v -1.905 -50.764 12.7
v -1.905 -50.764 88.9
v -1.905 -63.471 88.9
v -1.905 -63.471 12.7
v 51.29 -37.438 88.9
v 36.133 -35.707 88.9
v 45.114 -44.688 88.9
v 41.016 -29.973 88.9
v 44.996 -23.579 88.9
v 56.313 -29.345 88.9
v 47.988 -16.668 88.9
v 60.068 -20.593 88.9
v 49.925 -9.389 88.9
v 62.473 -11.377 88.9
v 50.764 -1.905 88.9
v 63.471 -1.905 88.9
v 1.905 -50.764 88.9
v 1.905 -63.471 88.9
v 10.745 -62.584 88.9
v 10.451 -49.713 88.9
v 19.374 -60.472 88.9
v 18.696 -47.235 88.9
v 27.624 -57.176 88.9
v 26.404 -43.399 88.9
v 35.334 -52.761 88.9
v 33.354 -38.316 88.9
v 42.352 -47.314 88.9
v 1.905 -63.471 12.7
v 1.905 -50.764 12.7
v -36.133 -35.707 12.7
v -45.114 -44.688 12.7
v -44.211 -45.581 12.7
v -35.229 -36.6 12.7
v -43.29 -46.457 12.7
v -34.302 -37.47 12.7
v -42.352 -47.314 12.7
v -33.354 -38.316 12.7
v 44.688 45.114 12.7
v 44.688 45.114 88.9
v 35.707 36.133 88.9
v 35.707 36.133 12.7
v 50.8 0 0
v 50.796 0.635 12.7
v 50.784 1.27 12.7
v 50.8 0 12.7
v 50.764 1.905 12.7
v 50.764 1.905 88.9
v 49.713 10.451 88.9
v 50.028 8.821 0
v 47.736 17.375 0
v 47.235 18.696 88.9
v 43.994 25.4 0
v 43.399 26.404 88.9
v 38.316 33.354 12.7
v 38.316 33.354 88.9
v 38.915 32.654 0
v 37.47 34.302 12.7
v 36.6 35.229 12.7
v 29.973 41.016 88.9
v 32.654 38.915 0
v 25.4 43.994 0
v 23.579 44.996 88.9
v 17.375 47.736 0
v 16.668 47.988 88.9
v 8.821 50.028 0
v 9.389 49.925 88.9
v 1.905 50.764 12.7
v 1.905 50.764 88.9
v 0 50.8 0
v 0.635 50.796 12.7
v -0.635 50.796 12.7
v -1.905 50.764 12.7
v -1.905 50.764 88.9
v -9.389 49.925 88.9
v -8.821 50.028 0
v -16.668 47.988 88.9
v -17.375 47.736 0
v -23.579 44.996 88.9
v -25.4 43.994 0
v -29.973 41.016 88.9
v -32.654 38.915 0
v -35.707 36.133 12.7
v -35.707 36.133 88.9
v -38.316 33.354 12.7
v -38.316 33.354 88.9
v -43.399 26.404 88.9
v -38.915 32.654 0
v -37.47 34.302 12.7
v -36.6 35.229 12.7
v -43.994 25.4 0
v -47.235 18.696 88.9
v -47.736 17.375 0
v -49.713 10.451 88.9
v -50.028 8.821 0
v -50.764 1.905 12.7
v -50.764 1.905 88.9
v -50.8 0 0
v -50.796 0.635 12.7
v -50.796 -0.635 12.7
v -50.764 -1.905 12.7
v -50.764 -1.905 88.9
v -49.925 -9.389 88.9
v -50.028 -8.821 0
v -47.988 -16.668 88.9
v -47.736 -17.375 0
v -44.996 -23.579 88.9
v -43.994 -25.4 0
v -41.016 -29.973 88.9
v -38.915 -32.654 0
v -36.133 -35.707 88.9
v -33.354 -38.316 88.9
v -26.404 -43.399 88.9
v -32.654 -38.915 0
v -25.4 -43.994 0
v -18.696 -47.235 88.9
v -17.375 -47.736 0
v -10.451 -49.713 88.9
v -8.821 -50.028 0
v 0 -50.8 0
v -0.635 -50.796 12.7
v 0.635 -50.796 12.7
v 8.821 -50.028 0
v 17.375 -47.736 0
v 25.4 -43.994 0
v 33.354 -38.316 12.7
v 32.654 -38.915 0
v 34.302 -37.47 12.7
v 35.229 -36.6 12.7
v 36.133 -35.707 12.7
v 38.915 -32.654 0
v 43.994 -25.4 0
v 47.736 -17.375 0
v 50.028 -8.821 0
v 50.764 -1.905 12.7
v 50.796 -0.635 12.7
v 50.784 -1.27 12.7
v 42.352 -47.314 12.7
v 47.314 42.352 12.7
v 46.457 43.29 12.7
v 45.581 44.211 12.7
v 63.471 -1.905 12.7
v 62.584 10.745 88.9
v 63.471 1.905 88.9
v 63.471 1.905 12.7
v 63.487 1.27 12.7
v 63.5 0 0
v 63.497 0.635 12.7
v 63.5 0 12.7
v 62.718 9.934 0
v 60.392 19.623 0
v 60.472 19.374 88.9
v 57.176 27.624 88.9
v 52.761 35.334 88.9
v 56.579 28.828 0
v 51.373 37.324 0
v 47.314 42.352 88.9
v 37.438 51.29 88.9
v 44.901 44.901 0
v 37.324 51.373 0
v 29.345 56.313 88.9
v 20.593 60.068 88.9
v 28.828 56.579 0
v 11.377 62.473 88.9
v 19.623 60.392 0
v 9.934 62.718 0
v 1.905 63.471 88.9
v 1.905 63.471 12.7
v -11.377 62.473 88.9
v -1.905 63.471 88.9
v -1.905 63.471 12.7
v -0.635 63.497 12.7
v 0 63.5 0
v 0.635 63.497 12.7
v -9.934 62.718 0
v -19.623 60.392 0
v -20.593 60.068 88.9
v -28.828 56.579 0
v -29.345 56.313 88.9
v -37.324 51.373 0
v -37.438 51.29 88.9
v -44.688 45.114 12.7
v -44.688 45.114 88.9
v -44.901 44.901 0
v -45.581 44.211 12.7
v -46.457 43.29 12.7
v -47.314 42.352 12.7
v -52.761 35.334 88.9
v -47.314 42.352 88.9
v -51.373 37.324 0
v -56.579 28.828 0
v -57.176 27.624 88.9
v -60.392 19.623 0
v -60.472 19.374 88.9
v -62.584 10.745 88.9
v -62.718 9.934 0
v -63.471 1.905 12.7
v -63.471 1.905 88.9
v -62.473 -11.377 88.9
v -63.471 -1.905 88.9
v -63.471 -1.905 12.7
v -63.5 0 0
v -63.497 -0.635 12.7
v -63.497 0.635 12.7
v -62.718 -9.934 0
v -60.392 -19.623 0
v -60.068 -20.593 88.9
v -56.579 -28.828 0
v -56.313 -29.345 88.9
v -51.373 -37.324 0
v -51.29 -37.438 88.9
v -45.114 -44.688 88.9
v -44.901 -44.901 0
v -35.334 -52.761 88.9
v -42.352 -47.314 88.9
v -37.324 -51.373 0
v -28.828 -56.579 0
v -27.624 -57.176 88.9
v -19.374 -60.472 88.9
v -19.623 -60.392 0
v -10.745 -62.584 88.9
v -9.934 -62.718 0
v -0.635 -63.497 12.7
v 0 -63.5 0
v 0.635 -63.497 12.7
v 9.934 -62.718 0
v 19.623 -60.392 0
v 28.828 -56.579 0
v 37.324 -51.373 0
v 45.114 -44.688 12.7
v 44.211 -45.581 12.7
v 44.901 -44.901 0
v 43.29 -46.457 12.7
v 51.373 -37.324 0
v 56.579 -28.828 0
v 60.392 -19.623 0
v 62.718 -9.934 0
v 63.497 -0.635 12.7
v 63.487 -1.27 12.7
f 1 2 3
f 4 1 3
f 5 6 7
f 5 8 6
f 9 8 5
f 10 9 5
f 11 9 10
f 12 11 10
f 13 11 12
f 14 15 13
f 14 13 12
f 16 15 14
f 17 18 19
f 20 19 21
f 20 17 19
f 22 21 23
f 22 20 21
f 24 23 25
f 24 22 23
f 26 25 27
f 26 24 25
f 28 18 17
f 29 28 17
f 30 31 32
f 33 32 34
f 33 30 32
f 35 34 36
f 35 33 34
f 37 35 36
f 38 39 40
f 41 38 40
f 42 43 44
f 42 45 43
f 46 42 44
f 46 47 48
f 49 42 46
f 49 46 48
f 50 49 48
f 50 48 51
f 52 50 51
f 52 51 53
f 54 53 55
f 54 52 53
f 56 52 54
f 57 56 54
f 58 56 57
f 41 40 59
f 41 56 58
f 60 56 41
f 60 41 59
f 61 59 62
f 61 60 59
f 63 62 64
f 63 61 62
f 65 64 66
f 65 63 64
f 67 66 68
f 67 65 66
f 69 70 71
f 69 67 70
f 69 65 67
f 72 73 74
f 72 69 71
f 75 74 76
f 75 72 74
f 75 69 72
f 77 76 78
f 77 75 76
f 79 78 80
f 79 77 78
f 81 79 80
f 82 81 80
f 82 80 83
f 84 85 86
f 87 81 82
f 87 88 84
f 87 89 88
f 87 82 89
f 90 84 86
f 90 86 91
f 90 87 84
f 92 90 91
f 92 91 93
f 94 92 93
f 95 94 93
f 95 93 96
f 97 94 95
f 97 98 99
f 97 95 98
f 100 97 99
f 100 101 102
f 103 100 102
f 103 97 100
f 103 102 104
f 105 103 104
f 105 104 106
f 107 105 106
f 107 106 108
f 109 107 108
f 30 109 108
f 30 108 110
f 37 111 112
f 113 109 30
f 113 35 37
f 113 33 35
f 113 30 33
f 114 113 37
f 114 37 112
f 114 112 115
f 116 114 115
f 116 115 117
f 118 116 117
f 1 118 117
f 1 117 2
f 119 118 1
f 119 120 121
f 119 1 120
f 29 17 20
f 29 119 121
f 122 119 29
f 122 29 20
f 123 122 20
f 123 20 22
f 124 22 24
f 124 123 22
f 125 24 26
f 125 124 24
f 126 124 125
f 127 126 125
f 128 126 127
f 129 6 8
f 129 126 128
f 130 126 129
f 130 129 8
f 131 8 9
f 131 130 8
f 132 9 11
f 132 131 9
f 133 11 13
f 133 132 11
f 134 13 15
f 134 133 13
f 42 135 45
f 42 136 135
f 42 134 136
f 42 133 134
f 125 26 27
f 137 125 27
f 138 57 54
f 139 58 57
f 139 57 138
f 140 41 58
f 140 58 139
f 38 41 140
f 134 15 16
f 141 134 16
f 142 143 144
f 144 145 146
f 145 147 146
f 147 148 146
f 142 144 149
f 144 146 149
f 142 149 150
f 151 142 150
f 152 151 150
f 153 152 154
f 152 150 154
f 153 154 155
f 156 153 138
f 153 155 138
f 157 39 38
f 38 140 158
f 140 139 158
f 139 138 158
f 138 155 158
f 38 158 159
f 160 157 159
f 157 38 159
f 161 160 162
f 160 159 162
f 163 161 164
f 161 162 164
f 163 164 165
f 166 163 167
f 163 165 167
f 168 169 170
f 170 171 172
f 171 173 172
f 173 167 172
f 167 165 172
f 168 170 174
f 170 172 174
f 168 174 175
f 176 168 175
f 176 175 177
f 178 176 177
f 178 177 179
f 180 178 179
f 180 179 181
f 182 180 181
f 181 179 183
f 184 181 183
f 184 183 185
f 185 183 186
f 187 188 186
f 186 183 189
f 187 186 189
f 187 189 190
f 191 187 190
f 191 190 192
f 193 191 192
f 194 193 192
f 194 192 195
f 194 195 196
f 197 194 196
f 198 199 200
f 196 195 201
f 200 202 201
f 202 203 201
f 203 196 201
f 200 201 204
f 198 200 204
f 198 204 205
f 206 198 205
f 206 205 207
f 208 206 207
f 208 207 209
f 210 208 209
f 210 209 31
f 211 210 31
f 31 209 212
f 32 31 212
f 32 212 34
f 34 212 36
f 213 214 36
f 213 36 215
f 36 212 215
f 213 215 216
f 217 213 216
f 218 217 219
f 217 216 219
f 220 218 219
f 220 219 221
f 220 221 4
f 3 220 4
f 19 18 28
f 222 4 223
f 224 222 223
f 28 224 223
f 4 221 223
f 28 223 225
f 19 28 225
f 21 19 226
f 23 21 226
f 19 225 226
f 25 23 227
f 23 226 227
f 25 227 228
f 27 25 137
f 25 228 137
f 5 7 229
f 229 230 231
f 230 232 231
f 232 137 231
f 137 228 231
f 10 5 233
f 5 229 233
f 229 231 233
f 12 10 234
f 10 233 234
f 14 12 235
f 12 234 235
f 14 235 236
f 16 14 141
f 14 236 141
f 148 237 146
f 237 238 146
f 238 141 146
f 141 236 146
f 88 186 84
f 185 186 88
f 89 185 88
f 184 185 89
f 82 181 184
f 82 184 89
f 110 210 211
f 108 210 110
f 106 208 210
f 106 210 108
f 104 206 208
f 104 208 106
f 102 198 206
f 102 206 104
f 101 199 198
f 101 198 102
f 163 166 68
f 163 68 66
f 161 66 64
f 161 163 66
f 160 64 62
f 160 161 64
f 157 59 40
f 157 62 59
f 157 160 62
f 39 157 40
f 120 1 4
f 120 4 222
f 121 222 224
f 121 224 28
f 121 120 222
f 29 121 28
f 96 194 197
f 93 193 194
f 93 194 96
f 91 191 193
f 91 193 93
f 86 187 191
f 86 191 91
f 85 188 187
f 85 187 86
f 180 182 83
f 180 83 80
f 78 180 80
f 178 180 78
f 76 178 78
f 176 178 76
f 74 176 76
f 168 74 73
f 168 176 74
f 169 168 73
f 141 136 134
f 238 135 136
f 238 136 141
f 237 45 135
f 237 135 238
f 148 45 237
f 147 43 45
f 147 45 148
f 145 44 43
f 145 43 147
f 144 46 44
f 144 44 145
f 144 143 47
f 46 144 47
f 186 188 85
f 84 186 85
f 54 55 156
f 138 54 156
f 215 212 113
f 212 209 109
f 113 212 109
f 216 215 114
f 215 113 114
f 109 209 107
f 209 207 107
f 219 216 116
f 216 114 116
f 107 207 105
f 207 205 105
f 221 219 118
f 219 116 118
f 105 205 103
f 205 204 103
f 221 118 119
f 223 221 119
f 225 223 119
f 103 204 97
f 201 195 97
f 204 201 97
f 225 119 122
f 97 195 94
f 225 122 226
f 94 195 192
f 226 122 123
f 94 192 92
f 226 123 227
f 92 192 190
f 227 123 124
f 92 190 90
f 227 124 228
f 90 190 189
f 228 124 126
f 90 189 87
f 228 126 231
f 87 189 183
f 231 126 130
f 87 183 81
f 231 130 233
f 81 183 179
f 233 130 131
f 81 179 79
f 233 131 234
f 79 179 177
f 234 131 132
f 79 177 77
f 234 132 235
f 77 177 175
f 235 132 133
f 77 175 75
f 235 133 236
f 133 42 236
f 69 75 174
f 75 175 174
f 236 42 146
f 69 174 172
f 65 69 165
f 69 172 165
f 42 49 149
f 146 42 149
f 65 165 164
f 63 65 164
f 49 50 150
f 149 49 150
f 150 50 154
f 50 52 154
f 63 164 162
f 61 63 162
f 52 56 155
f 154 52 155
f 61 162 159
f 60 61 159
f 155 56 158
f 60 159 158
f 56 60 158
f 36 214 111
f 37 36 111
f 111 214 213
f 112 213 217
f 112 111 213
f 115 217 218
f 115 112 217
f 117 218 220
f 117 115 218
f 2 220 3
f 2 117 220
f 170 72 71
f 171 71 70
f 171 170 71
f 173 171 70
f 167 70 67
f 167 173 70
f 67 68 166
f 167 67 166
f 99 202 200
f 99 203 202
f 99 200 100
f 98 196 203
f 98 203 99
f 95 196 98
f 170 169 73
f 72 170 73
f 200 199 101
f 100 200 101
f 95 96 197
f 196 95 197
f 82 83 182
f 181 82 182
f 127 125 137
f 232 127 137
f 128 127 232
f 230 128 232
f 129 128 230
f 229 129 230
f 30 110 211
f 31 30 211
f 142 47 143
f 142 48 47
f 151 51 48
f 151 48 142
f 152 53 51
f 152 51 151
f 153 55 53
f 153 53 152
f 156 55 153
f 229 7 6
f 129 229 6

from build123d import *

# Parameters (mm, degrees)
F0_R     = 63.5
F0_R_2   = 50.8
F1_DEPTH = 88.9
F4_DEPTH = 76.2


# Not quite as in the source:
# - a feature of the source that left no trace in its solid (it failed there, or was rolled back) is left out


with BuildPart() as f1:
    # F0 (on Top) → F1 (new body)
    with BuildSketch(Plane.XY):
        Circle(F0_R)
        Circle(F0_R_2, mode=Mode.SUBTRACT)
    extrude(amount=F1_DEPTH)

    # F3 (on face) → F4 (cut)
    with BuildSketch(Plane.XY.offset(88.9)):
        with BuildLine():
            Line((-1.905, -6.8671500075), (-1.905, -3.0571500075))
            Line((-1.905, -3.0571500075), (-2.6940768363, -2.2680731712))
            Line((-2.6940768363, -2.2680731712), (-36.1333947901, -35.7073911249))
            ThreePointArc((-36.1333947901, -35.7073911249), (-34.768258257, -37.0379294477), (-33.3541627773, -38.3163127848))
            Line((-33.3541627773, -38.3163127848), (-1.905, -6.8671500075))
        make_face()
        with BuildLine():
            ThreePointArc((-45.1137772181, -44.6877735529), (-43.7523970967, -46.0214922432), (-42.3516057863, -47.3137557938))
            Line((-42.3516057863, -47.3137557938), (-33.3541627773, -38.3163127848))
            ThreePointArc((-33.3541627773, -38.3163127848), (-34.768258257, -37.0379294477), (-36.1333947901, -35.7073911249))
            Line((-36.1333947901, -35.7073911249), (-45.1137772181, -44.6877735529))
        make_face()
        with BuildLine():
            Line((-44.6998995402, -49.6620495477), (-42.3516057863, -47.3137557938))
            ThreePointArc((-42.3516057863, -47.3137557938), (-43.7523970967, -46.0214922432), (-45.1137772181, -44.6877735529))
            Line((-45.1137772181, -44.6877735529), (-47.3939763765, -46.9679727114))
            Line((-47.3939763765, -46.9679727114), (-44.6998995402, -49.6620495477))
        make_face()
        with BuildLine():
            Line((-67.31, -1.905), (-63.4714185677, -1.905))
            ThreePointArc((-63.4714185677, -1.905), (-63.5, 0), (-63.4714185677, 1.905))
            Line((-63.4714185677, 1.905), (-67.31, 1.905))
            Line((-67.31, 1.905), (-67.31, -1.905))
        make_face()
        with BuildLine():
            ThreePointArc((-63.4714185677, 1.905), (-63.5, 0), (-63.4714185677, -1.905))
            Line((-63.4714185677, -1.905), (-50.7642686838, -1.905))
            ThreePointArc((-50.7642686838, -1.905), (-50.8, 0), (-50.7642686838, 1.905))
            Line((-50.7642686838, 1.905), (-63.4714185677, 1.905))
        make_face()
        with BuildLine():
            Line((-50.7642686838, -1.905), (-3.0571500075, -1.905))
            Line((-3.0571500075, -1.905), (-6.8671500075, 1.905))
            Line((-6.8671500075, 1.905), (-50.7642686838, 1.905))
            ThreePointArc((-50.7642686838, 1.905), (-50.8, 0), (-50.7642686838, -1.905))
        make_face()
        with BuildLine():
            Line((-6.8671500075, 1.905), (-1.905, 1.905))
            Line((-1.905, 1.905), (-1.905, 2.3310036652))
            Line((-1.905, 2.3310036652), (-35.7073911249, 36.1333947901))
            ThreePointArc((-35.7073911249, 36.1333947901), (-37.0379294477, 34.768258257), (-38.3163127848, 33.3541627773))
            Line((-38.3163127848, 33.3541627773), (-6.8671500075, 1.905))
        make_face()
        with BuildLine():
            Line((1.905, 1.905), (6.8671500075, 1.905))
            Line((6.8671500075, 1.905), (38.3163127848, 33.3541627773))
            ThreePointArc((38.3163127848, 33.3541627773), (37.0379294477, 34.768258257), (35.7073911249, 36.1333947901))
            Line((35.7073911249, 36.1333947901), (1.905, 2.3310036652))
            Line((1.905, 2.3310036652), (1.905, 1.905))
        make_face()
        with BuildLine():
            Line((3.0571500075, -1.905), (50.7642686838, -1.905))
            ThreePointArc((50.7642686838, -1.905), (50.7910663854, -0.9526675347), (50.8, 0))
            ThreePointArc((50.8, 0), (50.7910663854, 0.9526675347), (50.7642686838, 1.905))
            Line((50.7642686838, 1.905), (6.8671500075, 1.905))
            Line((6.8671500075, 1.905), (3.0571500075, -1.905))
        make_face()
        with BuildLine():
            Line((50.7642686838, -1.905), (63.4714185677, -1.905))
            ThreePointArc((63.4714185677, -1.905), (63.4928542399, -0.9526071985), (63.5, 0))
            ThreePointArc((63.5, 0), (63.4928542399, 0.9526071985), (63.4714185677, 1.905))
            Line((63.4714185677, 1.905), (50.7642686838, 1.905))
            ThreePointArc((50.7642686838, 1.905), (50.7910663854, 0.9526675347), (50.8, 0))
            ThreePointArc((50.8, 0), (50.7910663854, -0.9526675347), (50.7642686838, -1.905))
        make_face()
        with BuildLine():
            Line((38.3163127848, 33.3541627773), (47.3137557938, 42.3516057863))
            ThreePointArc((47.3137557938, 42.3516057863), (46.0214922432, 43.7523970967), (44.6877735529, 45.1137772181))
            Line((44.6877735529, 45.1137772181), (35.7073911249, 36.1333947901))
            ThreePointArc((35.7073911249, 36.1333947901), (37.0379294477, 34.768258257), (38.3163127848, 33.3541627773))
        make_face()
        with BuildLine():
            ThreePointArc((33.3541627773, -38.3163127848), (34.768258257, -37.0379294477), (36.1333947901, -35.7073911249))
            Line((36.1333947901, -35.7073911249), (2.6940768363, -2.2680731712))
            Line((2.6940768363, -2.2680731712), (1.905, -3.0571500075))
            Line((1.905, -3.0571500075), (1.905, -6.8671500075))
            Line((1.905, -6.8671500075), (33.3541627773, -38.3163127848))
        make_face()
        with BuildLine():
            ThreePointArc((42.3516057863, -47.3137557938), (43.7523970967, -46.0214922432), (45.1137772181, -44.6877735529))
            Line((45.1137772181, -44.6877735529), (36.1333947901, -35.7073911249))
            ThreePointArc((36.1333947901, -35.7073911249), (34.768258257, -37.0379294477), (33.3541627773, -38.3163127848))
            Line((33.3541627773, -38.3163127848), (42.3516057863, -47.3137557938))
        make_face()
        with BuildLine():
            Line((52.015964851, -51.5899611858), (45.1137772181, -44.6877735529))
            ThreePointArc((45.1137772181, -44.6877735529), (43.7523970967, -46.0214922432), (42.3516057863, -47.3137557938))
            Line((42.3516057863, -47.3137557938), (49.3218880147, -54.2840380222))
            Line((49.3218880147, -54.2840380222), (52.015964851, -51.5899611858))
        make_face()
        with BuildLine():
            Line((63.4714185677, -1.905), (67.31, -1.905))
            Line((67.31, -1.905), (67.31, 1.905))
            Line((67.31, 1.905), (63.4714185677, 1.905))
            ThreePointArc((63.4714185677, 1.905), (63.4928542399, 0.9526071985), (63.5, 0))
            ThreePointArc((63.5, 0), (63.4928542399, -0.9526071985), (63.4714185677, -1.905))
        make_face()
        with BuildLine():
            ThreePointArc((44.6877735529, 45.1137772181), (46.0214922432, 43.7523970967), (47.3137557938, 42.3516057863))
            Line((47.3137557938, 42.3516057863), (51.0685980704, 46.106448063))
            Line((51.0685980704, 46.106448063), (48.3745212341, 48.8005248993))
            Line((48.3745212341, 48.8005248993), (44.6877735529, 45.1137772181))
        make_face()
        with BuildLine():
            Line((-35.7073911249, 36.1333947901), (-44.6877735529, 45.1137772181))
            ThreePointArc((-44.6877735529, 45.1137772181), (-46.0214922432, 43.7523970967), (-47.3137557938, 42.3516057863))
            Line((-47.3137557938, 42.3516057863), (-38.3163127848, 33.3541627773))
            ThreePointArc((-38.3163127848, 33.3541627773), (-37.0379294477, 34.768258257), (-35.7073911249, 36.1333947901))
        make_face()
        with BuildLine():
            Line((-1.4789963348, 1.905), (1.4789963348, 1.905))
            Line((1.4789963348, 1.905), (1.905, 2.3310036652))
            Line((1.905, 2.3310036652), (1.905, 50.7642686838))
            ThreePointArc((1.905, 50.7642686838), (0, 50.8), (-1.905, 50.7642686838))
            Line((-1.905, 50.7642686838), (-1.905, 2.3310036652))
            Line((-1.905, 2.3310036652), (-1.4789963348, 1.905))
        make_face()
        with BuildLine():
            Line((1.905, 50.7642686838), (1.905, 63.4714185677))
            ThreePointArc((1.905, 63.4714185677), (0, 63.5), (-1.905, 63.4714185677))
            Line((-1.905, 63.4714185677), (-1.905, 50.7642686838))
            ThreePointArc((-1.905, 50.7642686838), (0, 50.8), (1.905, 50.7642686838))
        make_face()
        with BuildLine():
            ThreePointArc((-47.3137557938, 42.3516057863), (-46.0214922432, 43.7523970967), (-44.6877735529, 45.1137772181))
            Line((-44.6877735529, 45.1137772181), (-47.5721312908, 47.998134956))
            Line((-47.5721312908, 47.998134956), (-50.2662081271, 45.3040581197))
            Line((-50.2662081271, 45.3040581197), (-47.3137557938, 42.3516057863))
        make_face()
        with BuildLine():
            ThreePointArc((-1.905, 63.4714185677), (0, 63.5), (1.905, 63.4714185677))
            Line((1.905, 63.4714185677), (1.905, 67.31))
            Line((1.905, 67.31), (-1.905, 67.31))
            Line((-1.905, 67.31), (-1.905, 63.4714185677))
        make_face()
        with BuildLine():
            ThreePointArc((-1.905, -63.4714185677), (0, -63.5), (1.905, -63.4714185677))
            Line((1.905, -63.4714185677), (1.905, -50.7642686838))
            ThreePointArc((1.905, -50.7642686838), (0, -50.8), (-1.905, -50.7642686838))
            Line((-1.905, -50.7642686838), (-1.905, -63.4714185677))
        make_face()
        with BuildLine():
            Line((1.905, -50.7642686838), (1.905, -6.8671500075))
            Line((1.905, -6.8671500075), (0, -4.9621500075))
            Line((0, -4.9621500075), (-1.905, -6.8671500075))
            Line((-1.905, -6.8671500075), (-1.905, -50.7642686838))
            ThreePointArc((-1.905, -50.7642686838), (0, -50.8), (1.905, -50.7642686838))
        make_face()
    extrude(amount=-F4_DEPTH, mode=Mode.SUBTRACT)


solid = f1.part
